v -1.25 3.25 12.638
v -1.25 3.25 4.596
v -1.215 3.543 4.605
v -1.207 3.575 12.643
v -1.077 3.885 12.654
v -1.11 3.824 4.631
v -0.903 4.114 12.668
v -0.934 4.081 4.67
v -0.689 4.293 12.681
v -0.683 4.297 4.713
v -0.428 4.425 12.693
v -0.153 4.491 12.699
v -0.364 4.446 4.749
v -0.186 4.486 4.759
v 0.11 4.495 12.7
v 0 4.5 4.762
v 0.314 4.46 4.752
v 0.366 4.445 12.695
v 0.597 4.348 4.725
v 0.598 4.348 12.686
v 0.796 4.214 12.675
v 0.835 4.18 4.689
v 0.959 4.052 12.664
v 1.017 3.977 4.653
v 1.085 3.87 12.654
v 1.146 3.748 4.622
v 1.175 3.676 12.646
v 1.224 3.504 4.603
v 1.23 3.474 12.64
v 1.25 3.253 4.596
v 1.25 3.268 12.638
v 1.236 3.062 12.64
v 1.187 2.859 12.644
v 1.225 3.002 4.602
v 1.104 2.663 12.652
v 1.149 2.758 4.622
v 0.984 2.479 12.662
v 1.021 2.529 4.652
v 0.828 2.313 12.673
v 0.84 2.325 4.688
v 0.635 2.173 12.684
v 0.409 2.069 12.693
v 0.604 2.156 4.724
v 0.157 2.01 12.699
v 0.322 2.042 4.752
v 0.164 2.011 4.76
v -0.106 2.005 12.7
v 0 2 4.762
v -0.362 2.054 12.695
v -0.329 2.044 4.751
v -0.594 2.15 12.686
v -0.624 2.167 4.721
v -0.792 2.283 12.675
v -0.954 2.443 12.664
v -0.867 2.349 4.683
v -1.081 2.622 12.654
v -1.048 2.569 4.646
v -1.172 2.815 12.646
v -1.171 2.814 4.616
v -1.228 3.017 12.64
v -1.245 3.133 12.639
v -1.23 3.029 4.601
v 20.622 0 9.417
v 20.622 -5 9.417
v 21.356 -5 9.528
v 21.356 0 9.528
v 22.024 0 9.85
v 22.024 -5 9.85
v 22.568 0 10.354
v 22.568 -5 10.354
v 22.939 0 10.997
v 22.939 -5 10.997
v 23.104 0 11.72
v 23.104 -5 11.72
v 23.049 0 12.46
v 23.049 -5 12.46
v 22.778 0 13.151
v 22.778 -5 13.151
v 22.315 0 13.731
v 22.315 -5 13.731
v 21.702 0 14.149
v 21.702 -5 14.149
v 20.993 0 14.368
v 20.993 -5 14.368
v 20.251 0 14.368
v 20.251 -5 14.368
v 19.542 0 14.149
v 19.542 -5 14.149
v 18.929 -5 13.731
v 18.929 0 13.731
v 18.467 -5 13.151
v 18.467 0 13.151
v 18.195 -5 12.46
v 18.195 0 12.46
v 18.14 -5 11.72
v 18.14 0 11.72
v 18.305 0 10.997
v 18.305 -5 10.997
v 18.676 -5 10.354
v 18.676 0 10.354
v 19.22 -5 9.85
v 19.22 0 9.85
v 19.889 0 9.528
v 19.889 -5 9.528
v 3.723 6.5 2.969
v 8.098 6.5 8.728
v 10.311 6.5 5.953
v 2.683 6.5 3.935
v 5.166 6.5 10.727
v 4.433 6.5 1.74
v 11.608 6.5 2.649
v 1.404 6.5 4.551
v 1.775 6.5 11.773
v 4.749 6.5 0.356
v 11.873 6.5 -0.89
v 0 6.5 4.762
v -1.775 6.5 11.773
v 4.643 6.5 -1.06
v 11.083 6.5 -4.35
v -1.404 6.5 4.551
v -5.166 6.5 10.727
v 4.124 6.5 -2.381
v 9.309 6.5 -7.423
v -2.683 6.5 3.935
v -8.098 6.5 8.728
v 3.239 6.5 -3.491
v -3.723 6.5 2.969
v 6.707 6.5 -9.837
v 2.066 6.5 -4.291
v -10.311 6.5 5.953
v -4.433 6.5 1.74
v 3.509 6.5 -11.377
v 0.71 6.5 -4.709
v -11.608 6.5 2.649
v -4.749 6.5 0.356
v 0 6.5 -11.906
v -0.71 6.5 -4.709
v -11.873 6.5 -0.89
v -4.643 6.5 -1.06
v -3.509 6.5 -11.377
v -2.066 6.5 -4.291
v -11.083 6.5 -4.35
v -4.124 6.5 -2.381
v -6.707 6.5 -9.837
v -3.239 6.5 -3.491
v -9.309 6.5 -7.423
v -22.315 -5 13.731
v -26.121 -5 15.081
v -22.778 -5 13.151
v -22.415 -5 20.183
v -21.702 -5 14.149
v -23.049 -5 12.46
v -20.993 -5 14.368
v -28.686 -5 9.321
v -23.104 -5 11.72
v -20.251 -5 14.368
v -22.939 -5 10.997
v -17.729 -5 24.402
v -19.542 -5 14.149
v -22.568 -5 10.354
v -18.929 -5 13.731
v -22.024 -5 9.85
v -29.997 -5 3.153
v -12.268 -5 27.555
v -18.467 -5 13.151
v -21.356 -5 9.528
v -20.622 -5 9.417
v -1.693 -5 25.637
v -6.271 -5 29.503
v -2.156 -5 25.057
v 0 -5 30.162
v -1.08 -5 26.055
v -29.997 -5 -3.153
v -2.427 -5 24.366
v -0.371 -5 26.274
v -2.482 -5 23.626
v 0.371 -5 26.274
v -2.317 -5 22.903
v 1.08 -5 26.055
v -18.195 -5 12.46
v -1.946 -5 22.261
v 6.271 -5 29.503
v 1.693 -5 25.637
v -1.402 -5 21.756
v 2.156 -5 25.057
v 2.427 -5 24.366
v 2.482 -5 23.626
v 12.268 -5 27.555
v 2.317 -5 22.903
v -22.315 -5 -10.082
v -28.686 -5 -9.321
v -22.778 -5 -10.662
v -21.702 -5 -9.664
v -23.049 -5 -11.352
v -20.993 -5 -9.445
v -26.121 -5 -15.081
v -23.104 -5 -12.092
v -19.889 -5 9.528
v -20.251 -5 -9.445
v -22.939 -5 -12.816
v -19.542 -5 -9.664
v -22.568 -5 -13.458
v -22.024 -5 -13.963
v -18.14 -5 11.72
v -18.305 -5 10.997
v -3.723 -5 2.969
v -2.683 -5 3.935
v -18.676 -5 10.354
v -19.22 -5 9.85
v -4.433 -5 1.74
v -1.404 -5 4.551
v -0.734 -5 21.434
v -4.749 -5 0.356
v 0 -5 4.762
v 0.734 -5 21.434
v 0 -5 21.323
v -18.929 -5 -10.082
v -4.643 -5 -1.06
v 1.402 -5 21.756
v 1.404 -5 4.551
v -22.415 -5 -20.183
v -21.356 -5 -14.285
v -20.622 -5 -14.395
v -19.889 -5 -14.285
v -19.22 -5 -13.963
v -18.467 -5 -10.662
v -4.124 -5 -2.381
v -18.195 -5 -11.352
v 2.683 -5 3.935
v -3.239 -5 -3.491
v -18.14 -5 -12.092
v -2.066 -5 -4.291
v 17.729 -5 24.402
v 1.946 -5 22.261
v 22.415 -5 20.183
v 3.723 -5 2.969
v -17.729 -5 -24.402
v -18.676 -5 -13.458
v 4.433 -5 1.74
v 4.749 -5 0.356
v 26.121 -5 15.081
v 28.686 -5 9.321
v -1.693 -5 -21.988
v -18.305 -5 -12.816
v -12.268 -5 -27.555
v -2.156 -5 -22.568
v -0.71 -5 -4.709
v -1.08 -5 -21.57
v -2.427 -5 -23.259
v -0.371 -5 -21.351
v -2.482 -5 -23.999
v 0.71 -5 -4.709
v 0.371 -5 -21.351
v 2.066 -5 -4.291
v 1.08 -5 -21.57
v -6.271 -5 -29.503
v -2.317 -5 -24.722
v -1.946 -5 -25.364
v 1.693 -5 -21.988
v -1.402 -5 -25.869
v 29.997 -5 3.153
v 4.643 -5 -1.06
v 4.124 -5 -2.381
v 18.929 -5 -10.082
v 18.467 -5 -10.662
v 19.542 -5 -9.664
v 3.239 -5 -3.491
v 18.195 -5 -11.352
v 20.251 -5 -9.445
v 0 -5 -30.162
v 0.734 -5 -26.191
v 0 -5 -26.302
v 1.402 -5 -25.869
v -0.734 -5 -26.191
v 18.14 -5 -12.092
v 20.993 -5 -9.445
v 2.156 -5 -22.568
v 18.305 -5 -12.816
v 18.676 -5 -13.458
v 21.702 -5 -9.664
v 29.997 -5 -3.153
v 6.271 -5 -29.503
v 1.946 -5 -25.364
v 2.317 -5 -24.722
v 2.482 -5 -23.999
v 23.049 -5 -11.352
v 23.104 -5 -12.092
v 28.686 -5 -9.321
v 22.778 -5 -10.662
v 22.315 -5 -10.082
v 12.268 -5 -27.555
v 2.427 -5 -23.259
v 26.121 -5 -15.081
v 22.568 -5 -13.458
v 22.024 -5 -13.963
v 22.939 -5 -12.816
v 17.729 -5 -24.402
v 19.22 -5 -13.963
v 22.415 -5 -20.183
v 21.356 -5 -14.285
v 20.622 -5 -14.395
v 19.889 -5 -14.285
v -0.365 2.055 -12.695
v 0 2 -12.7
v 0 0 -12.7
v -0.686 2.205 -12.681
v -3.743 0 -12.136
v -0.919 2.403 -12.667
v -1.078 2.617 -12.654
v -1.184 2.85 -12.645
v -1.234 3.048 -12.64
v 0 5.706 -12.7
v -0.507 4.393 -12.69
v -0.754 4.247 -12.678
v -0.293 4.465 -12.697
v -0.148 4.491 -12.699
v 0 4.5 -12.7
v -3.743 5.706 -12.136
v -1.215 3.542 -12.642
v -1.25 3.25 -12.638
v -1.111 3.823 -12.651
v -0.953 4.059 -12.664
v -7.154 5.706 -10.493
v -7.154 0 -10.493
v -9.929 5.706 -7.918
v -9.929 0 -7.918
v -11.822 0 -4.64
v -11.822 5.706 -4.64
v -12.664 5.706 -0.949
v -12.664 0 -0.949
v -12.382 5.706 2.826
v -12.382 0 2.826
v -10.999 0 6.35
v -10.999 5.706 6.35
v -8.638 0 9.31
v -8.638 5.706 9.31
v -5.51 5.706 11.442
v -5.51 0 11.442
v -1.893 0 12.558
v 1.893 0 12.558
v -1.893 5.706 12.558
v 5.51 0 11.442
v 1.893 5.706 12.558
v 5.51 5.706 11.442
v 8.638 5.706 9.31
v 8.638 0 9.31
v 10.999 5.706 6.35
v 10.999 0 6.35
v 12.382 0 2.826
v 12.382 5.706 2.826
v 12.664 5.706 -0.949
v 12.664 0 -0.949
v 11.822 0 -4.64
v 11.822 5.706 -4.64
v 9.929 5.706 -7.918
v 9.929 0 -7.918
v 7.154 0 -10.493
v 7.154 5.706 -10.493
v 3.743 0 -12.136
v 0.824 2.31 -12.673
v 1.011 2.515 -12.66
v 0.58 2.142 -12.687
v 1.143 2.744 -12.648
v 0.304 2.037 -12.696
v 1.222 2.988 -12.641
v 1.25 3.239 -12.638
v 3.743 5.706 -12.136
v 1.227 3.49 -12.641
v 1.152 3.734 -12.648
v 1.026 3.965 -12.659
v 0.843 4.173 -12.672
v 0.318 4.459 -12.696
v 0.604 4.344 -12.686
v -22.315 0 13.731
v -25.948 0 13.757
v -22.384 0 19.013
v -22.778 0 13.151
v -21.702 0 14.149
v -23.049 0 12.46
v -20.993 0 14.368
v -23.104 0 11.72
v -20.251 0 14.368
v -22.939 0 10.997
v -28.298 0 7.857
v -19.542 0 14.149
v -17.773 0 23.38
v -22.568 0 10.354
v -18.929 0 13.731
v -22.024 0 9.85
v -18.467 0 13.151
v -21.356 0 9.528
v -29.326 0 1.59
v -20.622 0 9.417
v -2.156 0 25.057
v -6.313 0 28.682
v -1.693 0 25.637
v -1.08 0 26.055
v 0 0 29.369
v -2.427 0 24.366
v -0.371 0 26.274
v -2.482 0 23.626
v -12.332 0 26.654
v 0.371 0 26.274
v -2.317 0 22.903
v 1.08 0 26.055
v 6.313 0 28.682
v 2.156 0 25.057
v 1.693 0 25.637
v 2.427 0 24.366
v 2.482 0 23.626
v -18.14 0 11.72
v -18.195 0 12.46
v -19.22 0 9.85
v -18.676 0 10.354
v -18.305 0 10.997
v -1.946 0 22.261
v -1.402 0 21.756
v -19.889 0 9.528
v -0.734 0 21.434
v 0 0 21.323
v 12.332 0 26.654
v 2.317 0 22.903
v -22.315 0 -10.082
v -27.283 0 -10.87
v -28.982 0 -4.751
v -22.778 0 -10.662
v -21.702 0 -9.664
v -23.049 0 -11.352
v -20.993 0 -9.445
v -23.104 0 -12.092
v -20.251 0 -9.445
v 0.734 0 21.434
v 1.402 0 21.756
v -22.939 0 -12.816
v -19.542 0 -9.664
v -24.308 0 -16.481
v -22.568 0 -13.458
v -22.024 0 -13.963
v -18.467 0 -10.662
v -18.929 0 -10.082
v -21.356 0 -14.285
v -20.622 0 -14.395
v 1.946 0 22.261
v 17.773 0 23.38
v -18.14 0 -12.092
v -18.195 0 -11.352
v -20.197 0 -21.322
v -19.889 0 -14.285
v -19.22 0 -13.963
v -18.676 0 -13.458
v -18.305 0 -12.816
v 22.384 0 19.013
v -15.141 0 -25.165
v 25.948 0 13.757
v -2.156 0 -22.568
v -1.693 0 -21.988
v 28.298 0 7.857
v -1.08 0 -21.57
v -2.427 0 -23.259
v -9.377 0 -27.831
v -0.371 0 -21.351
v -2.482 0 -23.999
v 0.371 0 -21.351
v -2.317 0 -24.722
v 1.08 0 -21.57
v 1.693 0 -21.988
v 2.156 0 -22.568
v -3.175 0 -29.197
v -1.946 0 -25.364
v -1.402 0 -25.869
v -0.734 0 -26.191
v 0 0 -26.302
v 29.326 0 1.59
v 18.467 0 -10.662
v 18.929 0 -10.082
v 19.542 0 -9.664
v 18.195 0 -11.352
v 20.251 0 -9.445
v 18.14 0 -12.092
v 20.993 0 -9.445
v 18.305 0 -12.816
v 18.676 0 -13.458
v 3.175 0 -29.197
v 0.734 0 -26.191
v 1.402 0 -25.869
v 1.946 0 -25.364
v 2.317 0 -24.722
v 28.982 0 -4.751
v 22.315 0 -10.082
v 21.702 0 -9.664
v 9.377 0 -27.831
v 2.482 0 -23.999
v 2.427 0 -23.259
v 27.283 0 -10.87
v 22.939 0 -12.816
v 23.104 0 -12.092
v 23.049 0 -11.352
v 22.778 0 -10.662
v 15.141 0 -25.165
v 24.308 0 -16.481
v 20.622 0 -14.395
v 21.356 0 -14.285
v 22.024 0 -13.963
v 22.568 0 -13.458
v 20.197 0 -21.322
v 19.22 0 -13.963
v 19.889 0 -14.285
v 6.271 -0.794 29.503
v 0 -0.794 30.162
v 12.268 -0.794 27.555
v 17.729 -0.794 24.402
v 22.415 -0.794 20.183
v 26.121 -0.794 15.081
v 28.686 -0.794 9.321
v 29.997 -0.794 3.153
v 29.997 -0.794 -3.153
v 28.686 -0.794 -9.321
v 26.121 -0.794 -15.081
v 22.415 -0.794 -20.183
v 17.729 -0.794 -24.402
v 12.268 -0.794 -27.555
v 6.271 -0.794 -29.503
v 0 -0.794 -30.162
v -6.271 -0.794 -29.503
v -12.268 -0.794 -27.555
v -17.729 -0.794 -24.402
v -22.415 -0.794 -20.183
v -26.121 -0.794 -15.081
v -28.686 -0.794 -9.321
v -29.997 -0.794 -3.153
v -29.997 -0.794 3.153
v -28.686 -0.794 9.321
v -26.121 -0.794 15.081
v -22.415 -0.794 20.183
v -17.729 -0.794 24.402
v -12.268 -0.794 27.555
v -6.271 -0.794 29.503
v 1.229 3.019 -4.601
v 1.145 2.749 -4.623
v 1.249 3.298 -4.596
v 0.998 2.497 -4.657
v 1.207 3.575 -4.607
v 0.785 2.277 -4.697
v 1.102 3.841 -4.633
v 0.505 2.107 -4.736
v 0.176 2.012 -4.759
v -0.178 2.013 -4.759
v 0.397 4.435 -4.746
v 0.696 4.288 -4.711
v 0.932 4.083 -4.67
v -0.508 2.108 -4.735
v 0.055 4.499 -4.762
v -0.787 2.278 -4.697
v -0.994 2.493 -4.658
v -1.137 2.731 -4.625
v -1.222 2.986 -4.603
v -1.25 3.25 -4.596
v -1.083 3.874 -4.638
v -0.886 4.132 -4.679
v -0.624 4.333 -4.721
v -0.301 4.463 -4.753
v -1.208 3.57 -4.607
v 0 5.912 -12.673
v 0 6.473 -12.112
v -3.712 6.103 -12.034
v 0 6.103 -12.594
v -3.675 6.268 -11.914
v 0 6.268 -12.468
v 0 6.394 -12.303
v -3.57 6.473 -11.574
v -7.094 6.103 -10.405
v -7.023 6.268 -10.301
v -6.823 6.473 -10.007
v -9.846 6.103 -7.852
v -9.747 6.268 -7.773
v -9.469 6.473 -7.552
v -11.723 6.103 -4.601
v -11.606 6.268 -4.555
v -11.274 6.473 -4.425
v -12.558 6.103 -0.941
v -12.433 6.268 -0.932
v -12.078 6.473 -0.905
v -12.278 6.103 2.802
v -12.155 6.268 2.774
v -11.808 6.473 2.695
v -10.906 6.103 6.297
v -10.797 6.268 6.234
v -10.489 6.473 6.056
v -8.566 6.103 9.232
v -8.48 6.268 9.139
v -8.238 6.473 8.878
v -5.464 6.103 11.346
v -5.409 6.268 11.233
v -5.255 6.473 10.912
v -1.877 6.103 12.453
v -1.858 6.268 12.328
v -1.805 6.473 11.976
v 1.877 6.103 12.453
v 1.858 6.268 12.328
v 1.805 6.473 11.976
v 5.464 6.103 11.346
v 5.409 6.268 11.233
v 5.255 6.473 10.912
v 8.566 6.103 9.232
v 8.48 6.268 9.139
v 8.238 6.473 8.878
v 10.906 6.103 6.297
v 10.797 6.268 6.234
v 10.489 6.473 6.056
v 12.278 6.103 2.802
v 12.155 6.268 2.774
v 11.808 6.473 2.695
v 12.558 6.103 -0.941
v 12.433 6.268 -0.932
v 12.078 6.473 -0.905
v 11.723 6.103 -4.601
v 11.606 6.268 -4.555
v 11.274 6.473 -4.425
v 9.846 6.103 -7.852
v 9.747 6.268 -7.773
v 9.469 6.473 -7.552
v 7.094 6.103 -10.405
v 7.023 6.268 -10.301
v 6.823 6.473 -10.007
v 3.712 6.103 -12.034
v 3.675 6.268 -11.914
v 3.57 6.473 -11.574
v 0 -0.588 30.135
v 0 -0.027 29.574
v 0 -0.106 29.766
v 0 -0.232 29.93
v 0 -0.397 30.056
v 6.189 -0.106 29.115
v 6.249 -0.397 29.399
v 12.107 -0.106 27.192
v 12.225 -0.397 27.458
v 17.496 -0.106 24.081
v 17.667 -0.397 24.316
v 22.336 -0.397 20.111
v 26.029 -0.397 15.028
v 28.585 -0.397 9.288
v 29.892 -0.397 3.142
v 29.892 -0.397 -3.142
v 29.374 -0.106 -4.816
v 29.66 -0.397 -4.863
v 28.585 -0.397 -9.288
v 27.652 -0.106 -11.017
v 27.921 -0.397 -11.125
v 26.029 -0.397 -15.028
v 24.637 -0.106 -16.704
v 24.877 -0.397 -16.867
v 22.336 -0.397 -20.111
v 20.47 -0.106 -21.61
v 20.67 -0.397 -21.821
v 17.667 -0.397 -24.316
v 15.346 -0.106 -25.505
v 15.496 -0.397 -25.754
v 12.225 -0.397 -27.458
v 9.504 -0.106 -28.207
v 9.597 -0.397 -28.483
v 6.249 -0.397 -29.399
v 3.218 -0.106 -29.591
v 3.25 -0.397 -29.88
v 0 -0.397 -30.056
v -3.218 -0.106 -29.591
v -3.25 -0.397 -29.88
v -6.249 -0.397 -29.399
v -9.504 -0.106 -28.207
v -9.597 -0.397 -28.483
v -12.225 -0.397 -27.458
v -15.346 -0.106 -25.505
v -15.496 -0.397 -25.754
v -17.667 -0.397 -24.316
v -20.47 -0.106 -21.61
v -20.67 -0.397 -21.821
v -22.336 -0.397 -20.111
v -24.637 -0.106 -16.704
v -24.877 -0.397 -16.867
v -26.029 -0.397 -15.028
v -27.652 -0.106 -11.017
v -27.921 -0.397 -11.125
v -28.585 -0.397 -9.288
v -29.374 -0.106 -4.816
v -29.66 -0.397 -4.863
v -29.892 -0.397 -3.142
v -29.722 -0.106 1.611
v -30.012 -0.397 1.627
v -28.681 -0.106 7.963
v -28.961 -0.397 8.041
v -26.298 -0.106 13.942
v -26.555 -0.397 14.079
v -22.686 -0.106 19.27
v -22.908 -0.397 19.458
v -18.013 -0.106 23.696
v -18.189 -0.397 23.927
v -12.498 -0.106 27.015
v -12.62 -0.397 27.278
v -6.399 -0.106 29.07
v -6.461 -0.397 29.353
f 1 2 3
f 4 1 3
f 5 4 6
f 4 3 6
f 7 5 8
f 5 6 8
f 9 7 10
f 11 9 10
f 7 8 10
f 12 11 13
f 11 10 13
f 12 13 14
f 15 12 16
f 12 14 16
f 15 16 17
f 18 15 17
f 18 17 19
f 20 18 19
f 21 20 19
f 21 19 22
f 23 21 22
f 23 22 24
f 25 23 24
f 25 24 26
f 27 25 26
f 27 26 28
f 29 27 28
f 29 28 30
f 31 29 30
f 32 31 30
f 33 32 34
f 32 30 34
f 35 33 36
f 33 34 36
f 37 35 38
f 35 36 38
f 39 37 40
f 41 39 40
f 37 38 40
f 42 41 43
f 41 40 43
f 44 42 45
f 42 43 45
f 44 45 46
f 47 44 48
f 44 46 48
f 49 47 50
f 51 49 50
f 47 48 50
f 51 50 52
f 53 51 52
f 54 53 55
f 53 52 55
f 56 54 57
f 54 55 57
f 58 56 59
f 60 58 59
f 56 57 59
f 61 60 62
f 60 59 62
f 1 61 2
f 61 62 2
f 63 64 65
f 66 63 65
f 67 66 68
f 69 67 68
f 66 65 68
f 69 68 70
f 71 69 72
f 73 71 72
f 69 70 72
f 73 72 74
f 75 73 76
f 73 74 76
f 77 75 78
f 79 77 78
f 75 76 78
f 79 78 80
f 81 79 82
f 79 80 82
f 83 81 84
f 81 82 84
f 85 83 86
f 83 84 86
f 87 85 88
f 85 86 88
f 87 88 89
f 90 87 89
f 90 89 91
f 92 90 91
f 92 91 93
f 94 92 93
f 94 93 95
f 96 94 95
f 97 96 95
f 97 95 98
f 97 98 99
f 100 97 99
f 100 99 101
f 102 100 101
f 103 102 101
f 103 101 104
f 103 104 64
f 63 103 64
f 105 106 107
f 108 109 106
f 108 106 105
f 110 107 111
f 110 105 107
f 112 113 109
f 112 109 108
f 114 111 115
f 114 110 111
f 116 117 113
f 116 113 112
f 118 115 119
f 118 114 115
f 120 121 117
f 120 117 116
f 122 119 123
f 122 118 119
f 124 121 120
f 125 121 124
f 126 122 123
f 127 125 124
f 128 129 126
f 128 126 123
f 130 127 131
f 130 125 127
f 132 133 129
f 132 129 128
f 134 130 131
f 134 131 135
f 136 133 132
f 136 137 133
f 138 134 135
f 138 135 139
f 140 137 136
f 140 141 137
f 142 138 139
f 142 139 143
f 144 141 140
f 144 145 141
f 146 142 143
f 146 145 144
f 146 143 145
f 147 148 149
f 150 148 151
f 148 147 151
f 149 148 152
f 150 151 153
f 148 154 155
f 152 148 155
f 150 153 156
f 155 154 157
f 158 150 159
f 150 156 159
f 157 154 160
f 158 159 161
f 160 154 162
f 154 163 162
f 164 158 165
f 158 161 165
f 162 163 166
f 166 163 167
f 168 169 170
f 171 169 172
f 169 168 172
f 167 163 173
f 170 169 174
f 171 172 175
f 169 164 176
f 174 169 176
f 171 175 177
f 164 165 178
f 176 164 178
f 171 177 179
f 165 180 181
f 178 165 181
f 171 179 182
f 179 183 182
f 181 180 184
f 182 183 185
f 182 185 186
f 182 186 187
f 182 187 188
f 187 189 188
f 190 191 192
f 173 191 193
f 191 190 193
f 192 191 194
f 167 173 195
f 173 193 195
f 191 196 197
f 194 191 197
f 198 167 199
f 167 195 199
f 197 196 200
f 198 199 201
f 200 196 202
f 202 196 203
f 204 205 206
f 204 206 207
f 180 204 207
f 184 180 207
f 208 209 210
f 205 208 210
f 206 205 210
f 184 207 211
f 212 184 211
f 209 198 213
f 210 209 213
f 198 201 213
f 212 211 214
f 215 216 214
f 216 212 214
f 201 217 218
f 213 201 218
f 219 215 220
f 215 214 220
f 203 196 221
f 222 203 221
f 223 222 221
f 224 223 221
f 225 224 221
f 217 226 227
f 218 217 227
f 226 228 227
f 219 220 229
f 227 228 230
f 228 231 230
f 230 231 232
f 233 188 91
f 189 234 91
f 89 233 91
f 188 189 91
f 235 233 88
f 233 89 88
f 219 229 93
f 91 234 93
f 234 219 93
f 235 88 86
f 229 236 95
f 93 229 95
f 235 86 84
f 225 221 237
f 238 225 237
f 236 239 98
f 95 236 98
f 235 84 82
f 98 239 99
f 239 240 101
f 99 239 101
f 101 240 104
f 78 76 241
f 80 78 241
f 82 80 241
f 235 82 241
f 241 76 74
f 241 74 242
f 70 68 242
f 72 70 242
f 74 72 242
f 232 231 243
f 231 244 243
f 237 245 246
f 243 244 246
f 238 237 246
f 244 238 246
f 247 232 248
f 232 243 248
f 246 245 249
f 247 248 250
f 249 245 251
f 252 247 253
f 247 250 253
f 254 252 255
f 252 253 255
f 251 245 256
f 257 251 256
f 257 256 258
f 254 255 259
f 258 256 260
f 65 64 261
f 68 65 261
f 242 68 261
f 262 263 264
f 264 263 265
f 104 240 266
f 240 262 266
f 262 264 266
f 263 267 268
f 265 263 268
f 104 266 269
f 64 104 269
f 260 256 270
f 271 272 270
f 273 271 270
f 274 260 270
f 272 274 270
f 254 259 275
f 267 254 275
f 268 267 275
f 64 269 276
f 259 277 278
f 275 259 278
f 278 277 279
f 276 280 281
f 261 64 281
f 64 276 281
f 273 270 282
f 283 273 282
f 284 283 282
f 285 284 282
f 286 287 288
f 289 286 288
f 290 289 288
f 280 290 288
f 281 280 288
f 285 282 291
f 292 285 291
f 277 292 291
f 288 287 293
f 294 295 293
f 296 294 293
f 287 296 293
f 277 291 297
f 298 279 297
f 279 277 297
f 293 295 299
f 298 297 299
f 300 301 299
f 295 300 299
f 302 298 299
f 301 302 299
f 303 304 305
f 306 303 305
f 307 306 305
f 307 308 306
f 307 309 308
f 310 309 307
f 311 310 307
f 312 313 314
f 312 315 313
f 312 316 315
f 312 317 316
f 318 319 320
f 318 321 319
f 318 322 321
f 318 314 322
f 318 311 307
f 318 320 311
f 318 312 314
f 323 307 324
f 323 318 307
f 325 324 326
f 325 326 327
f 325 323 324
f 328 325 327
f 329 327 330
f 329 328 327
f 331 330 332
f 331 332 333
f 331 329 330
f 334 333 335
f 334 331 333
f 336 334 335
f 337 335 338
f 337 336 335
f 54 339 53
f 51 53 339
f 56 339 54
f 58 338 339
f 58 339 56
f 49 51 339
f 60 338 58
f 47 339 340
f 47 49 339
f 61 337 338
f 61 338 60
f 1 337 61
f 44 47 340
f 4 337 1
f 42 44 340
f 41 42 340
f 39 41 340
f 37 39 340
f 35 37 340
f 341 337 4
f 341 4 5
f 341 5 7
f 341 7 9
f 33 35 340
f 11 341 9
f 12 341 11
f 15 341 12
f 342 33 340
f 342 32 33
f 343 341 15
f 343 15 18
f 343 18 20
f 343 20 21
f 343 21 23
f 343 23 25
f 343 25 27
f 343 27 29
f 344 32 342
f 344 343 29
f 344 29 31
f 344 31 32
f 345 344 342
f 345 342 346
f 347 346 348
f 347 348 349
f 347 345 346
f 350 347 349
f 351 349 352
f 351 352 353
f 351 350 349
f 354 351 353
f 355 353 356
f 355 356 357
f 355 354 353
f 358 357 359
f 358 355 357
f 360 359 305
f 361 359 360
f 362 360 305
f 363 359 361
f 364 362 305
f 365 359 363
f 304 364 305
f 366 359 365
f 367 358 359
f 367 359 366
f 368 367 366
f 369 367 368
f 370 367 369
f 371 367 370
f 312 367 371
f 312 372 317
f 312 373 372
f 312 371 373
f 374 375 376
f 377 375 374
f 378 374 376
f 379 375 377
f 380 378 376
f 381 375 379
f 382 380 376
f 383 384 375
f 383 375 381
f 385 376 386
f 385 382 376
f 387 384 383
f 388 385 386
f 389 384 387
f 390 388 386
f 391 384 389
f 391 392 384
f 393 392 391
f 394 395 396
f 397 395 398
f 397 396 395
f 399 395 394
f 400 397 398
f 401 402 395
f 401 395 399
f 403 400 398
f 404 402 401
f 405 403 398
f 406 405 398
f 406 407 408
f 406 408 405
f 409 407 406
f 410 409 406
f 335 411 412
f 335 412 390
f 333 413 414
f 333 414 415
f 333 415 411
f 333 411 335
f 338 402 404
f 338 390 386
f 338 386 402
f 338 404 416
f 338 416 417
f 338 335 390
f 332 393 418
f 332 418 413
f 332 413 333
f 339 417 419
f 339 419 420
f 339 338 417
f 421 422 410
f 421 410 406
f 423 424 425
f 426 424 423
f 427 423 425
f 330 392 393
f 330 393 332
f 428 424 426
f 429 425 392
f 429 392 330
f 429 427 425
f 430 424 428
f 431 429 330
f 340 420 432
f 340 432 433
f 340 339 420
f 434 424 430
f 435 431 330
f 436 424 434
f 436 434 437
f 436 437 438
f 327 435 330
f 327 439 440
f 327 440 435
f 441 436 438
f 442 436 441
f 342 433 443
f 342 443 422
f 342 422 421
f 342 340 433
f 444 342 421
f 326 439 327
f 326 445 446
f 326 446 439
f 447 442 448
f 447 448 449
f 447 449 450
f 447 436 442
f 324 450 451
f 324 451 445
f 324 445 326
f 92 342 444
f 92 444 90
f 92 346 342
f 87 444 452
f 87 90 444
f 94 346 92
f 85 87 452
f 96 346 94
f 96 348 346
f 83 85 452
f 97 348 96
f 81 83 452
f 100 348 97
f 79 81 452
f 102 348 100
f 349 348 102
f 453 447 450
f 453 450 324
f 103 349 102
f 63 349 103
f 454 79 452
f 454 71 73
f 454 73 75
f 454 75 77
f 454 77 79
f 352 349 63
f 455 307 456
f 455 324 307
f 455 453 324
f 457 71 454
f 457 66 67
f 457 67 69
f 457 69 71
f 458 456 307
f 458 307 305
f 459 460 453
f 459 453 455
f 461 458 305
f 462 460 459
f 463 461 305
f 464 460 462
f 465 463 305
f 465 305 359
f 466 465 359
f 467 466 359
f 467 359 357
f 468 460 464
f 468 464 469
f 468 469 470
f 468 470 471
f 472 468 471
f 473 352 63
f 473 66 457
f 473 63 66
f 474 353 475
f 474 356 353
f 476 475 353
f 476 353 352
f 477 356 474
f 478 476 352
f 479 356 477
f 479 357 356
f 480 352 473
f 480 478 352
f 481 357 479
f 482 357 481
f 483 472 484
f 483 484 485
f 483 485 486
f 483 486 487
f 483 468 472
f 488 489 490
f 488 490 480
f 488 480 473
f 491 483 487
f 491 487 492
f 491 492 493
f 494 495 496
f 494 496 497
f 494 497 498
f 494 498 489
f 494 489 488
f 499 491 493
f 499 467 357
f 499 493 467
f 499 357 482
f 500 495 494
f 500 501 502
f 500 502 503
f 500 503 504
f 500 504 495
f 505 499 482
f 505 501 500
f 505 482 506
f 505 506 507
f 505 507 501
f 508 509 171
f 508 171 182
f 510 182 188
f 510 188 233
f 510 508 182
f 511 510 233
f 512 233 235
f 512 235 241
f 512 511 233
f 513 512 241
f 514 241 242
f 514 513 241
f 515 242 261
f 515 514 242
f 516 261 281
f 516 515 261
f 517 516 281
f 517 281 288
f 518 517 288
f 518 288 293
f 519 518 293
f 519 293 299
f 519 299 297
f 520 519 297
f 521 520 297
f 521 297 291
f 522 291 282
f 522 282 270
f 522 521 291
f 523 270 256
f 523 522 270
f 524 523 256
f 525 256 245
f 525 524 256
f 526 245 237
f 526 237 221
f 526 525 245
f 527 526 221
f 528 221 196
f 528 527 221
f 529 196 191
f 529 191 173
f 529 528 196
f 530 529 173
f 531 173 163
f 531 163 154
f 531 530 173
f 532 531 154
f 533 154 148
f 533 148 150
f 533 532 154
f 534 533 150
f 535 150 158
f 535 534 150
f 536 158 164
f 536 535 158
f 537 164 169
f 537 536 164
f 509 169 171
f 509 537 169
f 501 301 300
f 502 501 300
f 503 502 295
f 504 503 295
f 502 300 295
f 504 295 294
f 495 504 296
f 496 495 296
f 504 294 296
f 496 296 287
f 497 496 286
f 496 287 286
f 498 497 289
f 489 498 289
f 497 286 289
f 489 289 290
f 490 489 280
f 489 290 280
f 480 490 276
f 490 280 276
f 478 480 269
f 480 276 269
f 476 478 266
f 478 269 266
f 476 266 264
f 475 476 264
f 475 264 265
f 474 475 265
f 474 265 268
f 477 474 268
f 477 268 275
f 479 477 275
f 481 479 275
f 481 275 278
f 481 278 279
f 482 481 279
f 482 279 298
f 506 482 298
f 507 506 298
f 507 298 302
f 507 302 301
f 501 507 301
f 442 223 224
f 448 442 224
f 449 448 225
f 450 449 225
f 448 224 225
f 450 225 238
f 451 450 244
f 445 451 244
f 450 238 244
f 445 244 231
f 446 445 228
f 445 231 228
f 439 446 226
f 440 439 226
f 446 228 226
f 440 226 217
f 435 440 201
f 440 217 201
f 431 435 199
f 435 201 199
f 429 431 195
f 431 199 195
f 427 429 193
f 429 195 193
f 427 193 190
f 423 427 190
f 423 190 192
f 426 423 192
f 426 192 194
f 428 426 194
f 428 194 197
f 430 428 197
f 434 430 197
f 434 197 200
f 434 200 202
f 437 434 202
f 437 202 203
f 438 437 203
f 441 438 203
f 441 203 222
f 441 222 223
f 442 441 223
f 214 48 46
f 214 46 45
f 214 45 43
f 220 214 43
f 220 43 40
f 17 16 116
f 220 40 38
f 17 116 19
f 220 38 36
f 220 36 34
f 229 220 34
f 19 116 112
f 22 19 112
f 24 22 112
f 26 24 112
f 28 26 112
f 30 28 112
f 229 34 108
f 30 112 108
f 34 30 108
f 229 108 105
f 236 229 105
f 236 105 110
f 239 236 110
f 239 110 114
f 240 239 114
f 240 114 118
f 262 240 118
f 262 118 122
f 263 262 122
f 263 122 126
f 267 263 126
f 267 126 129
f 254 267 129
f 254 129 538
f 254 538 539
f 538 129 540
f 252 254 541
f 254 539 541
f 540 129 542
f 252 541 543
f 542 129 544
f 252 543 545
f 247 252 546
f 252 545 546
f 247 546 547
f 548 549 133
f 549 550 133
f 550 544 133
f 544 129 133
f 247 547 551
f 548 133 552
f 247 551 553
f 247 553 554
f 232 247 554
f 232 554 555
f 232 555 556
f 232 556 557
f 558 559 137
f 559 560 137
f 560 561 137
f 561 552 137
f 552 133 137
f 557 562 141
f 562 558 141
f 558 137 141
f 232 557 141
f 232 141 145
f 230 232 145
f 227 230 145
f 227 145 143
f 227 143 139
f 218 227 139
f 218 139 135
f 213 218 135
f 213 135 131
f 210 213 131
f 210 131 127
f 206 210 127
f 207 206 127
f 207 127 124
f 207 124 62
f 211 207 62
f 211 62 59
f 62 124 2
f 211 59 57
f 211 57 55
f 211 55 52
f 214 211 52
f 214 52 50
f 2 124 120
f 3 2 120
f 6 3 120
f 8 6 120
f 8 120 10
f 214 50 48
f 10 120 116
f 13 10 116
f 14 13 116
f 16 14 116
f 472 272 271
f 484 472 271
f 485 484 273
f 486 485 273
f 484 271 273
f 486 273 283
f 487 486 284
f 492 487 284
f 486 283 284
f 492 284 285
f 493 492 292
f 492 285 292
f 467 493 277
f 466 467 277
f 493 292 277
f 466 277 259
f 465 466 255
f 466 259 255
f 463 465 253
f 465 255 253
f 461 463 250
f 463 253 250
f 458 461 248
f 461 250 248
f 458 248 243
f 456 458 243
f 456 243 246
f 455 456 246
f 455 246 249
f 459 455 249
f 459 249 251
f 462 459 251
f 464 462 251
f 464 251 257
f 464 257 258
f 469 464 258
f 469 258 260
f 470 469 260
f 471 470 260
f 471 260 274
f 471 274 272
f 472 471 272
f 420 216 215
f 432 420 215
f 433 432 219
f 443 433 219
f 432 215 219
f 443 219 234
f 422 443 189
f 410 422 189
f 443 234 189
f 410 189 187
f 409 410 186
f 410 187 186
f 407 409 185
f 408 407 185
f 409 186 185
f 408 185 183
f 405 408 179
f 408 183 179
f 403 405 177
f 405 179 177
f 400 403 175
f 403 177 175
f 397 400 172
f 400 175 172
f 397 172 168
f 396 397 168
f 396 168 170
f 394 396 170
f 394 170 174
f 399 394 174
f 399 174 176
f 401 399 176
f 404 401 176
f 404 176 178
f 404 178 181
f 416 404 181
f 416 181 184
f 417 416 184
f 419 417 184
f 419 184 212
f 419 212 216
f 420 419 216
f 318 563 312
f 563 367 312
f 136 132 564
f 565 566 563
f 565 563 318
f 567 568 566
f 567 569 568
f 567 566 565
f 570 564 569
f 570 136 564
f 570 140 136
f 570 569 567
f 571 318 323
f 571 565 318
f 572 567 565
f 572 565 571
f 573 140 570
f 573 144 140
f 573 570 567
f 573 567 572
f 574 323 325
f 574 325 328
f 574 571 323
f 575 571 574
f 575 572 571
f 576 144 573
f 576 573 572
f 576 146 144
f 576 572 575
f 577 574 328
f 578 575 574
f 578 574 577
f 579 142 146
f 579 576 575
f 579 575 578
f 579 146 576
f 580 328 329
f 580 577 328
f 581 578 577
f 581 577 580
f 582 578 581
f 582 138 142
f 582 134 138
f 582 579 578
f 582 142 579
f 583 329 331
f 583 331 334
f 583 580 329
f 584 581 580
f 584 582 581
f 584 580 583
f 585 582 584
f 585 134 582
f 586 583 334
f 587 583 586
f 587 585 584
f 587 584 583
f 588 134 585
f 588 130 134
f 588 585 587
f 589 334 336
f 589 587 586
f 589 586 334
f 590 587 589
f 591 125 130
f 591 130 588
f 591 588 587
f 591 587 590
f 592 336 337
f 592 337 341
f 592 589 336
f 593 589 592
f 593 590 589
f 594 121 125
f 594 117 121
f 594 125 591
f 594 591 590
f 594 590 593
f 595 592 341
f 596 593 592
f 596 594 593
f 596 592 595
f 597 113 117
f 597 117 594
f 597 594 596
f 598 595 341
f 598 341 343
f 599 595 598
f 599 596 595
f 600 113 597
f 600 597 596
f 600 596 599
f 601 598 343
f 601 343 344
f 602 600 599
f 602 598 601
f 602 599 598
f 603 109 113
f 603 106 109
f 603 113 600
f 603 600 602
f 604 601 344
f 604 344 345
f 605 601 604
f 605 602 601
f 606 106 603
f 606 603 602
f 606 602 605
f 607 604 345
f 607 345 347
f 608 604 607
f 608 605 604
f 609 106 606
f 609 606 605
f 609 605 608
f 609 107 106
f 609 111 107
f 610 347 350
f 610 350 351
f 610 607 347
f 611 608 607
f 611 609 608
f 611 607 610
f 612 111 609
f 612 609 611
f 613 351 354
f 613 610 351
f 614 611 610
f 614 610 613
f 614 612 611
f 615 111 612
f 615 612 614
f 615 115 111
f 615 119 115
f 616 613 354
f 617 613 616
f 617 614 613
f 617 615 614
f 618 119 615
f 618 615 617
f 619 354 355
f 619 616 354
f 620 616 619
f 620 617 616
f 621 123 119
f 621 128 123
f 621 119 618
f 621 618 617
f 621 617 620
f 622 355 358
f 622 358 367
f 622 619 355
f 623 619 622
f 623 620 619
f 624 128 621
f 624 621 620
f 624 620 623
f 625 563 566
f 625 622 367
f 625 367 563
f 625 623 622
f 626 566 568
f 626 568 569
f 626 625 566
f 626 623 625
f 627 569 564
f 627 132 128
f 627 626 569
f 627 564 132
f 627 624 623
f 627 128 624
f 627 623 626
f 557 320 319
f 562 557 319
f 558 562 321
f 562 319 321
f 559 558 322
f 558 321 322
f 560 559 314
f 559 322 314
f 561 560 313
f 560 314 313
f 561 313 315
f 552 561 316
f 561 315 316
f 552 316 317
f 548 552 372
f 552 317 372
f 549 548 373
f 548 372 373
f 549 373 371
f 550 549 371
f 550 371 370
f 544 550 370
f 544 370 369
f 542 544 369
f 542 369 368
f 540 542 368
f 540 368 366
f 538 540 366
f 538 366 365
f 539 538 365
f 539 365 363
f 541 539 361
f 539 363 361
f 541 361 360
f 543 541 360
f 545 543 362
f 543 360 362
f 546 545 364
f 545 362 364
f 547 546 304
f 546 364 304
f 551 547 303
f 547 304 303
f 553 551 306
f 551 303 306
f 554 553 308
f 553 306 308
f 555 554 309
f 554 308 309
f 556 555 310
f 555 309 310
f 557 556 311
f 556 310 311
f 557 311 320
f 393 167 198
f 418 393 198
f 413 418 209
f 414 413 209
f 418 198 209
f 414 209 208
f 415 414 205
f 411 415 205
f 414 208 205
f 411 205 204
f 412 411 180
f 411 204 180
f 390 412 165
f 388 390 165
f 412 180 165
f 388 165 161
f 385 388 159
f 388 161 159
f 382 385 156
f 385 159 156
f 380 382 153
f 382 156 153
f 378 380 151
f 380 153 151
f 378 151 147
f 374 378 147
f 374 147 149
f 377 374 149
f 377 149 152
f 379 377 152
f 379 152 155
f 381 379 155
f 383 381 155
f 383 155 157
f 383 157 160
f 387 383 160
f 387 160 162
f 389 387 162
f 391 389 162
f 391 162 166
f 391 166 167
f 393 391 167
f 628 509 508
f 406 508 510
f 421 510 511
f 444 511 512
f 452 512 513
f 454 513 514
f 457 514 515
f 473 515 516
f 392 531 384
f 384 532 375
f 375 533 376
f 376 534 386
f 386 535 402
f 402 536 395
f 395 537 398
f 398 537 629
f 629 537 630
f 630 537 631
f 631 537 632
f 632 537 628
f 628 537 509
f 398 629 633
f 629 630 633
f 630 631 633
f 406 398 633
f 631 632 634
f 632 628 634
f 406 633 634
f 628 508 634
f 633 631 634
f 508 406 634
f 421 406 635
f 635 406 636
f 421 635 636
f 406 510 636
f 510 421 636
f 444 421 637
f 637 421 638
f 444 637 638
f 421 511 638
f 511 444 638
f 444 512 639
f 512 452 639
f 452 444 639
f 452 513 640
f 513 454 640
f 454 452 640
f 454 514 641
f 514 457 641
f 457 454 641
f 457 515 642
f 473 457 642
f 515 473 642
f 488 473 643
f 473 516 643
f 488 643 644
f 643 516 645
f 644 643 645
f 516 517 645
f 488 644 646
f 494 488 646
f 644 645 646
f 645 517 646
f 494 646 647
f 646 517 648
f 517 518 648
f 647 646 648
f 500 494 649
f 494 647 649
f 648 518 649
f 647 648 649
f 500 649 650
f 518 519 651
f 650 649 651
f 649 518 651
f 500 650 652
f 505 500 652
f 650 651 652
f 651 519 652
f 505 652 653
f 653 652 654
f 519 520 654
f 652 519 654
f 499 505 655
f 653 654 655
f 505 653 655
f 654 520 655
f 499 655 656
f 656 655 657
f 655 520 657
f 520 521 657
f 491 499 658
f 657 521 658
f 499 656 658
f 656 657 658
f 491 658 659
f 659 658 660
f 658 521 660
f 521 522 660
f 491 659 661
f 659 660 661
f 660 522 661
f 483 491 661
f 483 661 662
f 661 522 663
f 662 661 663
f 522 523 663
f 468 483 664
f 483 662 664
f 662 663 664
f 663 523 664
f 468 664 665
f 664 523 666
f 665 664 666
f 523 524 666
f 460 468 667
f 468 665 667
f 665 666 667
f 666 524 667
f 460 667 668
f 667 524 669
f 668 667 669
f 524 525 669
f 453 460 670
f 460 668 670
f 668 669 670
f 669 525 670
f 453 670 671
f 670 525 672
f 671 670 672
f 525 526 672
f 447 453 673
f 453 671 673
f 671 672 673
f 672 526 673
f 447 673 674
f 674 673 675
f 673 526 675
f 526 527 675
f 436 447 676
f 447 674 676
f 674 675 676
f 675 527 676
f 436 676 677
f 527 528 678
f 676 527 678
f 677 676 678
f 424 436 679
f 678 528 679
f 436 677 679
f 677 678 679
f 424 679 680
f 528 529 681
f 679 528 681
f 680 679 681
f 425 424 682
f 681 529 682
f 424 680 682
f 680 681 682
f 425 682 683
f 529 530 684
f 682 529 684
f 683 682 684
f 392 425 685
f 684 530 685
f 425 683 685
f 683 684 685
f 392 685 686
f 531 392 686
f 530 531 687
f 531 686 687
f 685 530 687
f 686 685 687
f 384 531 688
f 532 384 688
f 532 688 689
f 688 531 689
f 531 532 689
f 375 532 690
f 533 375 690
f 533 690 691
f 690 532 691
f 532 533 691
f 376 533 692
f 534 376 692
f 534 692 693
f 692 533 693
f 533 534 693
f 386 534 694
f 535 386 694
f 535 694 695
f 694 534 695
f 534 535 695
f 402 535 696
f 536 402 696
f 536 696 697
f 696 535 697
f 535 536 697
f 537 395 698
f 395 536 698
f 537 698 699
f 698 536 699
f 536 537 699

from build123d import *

# Parameters (mm, degrees)
SKETCH1_R                   = 30.1625
SKETCH1_R_2                 = 12.7
SKETCH1_R_3                 = 4.7625
BOSS_EXTRUDE1_DEPTH         = 5
BOSS_EXTRUDE2_START         = 6.5
SKETCH1_3_R                 = 12.7
SKETCH1_3_R_2               = 4.7625
BOSS_EXTRUDE2_DEPTH         = 6.5
F_10_CLEARANCE_HOLE1_D      = 4.9784
TAP_DRILL_FOR_M3X0_5_TAP1_D = 2.5
FILLET1_R                   = 0.79375


with BuildPart() as part:
    # Sketch1 → Boss-Extrude1 (new body)
    # profile 1 of 2: a face of its own
    with BuildSketch(Plane(origin=(0, 0, 0), x_dir=(1, 0, 0), z_dir=(0, 1, 0))):
        with Locations(Location((0, 0, 0), (0, 0, 270))):
            Circle(SKETCH1_R)
        Circle(SKETCH1_R_2, mode=Mode.SUBTRACT)
    # profile 2 of 2: a face of its own
    with BuildSketch(Plane(origin=(0, 0, 0), x_dir=(1, 0, 0), z_dir=(0, 1, 0))):
        Circle(SKETCH1_R_2)
        with Locations(Location((0, 0, 0), (0, 0, 270))):
            Circle(SKETCH1_R_3, mode=Mode.SUBTRACT)
    extrude(amount=-BOSS_EXTRUDE1_DEPTH)

    # Sketch1<3> → Boss-Extrude2 (add)
    with BuildSketch(Plane(origin=(0, 0, 0), x_dir=(1, 0, 0), z_dir=(0, 1, 0)).offset(BOSS_EXTRUDE2_START)):
        with Locations(Location((0, 0, 0), (0, 0, 90))):
            Circle(SKETCH1_3_R)
        with Locations(Location((0, 0, 0), (0, 0, 270))):
            Circle(SKETCH1_3_R_2, mode=Mode.SUBTRACT)
    extrude(amount=-BOSS_EXTRUDE2_DEPTH)

    # #10 Clearance Hole1 (through all)
    with Locations(Plane(origin=(0, 0, -23.8125), x_dir=(0, 0, 1), z_dir=(0, 1, 0))):
        with Locations((0, 0), (11.90625, 20.622229928), (35.71875, 20.622229928), (11.90625, -20.622229928), (35.71875, -20.622229928), (47.625, 0)):
            Hole(F_10_CLEARANCE_HOLE1_D / 2)

    # Tap Drill for M3x0.5 Tap1 (through all)
    with Locations(Plane(origin=(0, 3.25, 12.7), x_dir=(1, 0, 0), z_dir=(0, 0, 1))):
        with Locations((0, 0)):
            Hole(TAP_DRILL_FOR_M3X0_5_TAP1_D / 2)

    # Fillet1
    fillet1_edges = [part.edges().sort_by_distance(p)[0] for p in [
        (0, 6.5, 12.7),
        (0, 0, -30.1625),
    ]]
    fillet(fillet1_edges, radius=FILLET1_R)


solid = part.part
